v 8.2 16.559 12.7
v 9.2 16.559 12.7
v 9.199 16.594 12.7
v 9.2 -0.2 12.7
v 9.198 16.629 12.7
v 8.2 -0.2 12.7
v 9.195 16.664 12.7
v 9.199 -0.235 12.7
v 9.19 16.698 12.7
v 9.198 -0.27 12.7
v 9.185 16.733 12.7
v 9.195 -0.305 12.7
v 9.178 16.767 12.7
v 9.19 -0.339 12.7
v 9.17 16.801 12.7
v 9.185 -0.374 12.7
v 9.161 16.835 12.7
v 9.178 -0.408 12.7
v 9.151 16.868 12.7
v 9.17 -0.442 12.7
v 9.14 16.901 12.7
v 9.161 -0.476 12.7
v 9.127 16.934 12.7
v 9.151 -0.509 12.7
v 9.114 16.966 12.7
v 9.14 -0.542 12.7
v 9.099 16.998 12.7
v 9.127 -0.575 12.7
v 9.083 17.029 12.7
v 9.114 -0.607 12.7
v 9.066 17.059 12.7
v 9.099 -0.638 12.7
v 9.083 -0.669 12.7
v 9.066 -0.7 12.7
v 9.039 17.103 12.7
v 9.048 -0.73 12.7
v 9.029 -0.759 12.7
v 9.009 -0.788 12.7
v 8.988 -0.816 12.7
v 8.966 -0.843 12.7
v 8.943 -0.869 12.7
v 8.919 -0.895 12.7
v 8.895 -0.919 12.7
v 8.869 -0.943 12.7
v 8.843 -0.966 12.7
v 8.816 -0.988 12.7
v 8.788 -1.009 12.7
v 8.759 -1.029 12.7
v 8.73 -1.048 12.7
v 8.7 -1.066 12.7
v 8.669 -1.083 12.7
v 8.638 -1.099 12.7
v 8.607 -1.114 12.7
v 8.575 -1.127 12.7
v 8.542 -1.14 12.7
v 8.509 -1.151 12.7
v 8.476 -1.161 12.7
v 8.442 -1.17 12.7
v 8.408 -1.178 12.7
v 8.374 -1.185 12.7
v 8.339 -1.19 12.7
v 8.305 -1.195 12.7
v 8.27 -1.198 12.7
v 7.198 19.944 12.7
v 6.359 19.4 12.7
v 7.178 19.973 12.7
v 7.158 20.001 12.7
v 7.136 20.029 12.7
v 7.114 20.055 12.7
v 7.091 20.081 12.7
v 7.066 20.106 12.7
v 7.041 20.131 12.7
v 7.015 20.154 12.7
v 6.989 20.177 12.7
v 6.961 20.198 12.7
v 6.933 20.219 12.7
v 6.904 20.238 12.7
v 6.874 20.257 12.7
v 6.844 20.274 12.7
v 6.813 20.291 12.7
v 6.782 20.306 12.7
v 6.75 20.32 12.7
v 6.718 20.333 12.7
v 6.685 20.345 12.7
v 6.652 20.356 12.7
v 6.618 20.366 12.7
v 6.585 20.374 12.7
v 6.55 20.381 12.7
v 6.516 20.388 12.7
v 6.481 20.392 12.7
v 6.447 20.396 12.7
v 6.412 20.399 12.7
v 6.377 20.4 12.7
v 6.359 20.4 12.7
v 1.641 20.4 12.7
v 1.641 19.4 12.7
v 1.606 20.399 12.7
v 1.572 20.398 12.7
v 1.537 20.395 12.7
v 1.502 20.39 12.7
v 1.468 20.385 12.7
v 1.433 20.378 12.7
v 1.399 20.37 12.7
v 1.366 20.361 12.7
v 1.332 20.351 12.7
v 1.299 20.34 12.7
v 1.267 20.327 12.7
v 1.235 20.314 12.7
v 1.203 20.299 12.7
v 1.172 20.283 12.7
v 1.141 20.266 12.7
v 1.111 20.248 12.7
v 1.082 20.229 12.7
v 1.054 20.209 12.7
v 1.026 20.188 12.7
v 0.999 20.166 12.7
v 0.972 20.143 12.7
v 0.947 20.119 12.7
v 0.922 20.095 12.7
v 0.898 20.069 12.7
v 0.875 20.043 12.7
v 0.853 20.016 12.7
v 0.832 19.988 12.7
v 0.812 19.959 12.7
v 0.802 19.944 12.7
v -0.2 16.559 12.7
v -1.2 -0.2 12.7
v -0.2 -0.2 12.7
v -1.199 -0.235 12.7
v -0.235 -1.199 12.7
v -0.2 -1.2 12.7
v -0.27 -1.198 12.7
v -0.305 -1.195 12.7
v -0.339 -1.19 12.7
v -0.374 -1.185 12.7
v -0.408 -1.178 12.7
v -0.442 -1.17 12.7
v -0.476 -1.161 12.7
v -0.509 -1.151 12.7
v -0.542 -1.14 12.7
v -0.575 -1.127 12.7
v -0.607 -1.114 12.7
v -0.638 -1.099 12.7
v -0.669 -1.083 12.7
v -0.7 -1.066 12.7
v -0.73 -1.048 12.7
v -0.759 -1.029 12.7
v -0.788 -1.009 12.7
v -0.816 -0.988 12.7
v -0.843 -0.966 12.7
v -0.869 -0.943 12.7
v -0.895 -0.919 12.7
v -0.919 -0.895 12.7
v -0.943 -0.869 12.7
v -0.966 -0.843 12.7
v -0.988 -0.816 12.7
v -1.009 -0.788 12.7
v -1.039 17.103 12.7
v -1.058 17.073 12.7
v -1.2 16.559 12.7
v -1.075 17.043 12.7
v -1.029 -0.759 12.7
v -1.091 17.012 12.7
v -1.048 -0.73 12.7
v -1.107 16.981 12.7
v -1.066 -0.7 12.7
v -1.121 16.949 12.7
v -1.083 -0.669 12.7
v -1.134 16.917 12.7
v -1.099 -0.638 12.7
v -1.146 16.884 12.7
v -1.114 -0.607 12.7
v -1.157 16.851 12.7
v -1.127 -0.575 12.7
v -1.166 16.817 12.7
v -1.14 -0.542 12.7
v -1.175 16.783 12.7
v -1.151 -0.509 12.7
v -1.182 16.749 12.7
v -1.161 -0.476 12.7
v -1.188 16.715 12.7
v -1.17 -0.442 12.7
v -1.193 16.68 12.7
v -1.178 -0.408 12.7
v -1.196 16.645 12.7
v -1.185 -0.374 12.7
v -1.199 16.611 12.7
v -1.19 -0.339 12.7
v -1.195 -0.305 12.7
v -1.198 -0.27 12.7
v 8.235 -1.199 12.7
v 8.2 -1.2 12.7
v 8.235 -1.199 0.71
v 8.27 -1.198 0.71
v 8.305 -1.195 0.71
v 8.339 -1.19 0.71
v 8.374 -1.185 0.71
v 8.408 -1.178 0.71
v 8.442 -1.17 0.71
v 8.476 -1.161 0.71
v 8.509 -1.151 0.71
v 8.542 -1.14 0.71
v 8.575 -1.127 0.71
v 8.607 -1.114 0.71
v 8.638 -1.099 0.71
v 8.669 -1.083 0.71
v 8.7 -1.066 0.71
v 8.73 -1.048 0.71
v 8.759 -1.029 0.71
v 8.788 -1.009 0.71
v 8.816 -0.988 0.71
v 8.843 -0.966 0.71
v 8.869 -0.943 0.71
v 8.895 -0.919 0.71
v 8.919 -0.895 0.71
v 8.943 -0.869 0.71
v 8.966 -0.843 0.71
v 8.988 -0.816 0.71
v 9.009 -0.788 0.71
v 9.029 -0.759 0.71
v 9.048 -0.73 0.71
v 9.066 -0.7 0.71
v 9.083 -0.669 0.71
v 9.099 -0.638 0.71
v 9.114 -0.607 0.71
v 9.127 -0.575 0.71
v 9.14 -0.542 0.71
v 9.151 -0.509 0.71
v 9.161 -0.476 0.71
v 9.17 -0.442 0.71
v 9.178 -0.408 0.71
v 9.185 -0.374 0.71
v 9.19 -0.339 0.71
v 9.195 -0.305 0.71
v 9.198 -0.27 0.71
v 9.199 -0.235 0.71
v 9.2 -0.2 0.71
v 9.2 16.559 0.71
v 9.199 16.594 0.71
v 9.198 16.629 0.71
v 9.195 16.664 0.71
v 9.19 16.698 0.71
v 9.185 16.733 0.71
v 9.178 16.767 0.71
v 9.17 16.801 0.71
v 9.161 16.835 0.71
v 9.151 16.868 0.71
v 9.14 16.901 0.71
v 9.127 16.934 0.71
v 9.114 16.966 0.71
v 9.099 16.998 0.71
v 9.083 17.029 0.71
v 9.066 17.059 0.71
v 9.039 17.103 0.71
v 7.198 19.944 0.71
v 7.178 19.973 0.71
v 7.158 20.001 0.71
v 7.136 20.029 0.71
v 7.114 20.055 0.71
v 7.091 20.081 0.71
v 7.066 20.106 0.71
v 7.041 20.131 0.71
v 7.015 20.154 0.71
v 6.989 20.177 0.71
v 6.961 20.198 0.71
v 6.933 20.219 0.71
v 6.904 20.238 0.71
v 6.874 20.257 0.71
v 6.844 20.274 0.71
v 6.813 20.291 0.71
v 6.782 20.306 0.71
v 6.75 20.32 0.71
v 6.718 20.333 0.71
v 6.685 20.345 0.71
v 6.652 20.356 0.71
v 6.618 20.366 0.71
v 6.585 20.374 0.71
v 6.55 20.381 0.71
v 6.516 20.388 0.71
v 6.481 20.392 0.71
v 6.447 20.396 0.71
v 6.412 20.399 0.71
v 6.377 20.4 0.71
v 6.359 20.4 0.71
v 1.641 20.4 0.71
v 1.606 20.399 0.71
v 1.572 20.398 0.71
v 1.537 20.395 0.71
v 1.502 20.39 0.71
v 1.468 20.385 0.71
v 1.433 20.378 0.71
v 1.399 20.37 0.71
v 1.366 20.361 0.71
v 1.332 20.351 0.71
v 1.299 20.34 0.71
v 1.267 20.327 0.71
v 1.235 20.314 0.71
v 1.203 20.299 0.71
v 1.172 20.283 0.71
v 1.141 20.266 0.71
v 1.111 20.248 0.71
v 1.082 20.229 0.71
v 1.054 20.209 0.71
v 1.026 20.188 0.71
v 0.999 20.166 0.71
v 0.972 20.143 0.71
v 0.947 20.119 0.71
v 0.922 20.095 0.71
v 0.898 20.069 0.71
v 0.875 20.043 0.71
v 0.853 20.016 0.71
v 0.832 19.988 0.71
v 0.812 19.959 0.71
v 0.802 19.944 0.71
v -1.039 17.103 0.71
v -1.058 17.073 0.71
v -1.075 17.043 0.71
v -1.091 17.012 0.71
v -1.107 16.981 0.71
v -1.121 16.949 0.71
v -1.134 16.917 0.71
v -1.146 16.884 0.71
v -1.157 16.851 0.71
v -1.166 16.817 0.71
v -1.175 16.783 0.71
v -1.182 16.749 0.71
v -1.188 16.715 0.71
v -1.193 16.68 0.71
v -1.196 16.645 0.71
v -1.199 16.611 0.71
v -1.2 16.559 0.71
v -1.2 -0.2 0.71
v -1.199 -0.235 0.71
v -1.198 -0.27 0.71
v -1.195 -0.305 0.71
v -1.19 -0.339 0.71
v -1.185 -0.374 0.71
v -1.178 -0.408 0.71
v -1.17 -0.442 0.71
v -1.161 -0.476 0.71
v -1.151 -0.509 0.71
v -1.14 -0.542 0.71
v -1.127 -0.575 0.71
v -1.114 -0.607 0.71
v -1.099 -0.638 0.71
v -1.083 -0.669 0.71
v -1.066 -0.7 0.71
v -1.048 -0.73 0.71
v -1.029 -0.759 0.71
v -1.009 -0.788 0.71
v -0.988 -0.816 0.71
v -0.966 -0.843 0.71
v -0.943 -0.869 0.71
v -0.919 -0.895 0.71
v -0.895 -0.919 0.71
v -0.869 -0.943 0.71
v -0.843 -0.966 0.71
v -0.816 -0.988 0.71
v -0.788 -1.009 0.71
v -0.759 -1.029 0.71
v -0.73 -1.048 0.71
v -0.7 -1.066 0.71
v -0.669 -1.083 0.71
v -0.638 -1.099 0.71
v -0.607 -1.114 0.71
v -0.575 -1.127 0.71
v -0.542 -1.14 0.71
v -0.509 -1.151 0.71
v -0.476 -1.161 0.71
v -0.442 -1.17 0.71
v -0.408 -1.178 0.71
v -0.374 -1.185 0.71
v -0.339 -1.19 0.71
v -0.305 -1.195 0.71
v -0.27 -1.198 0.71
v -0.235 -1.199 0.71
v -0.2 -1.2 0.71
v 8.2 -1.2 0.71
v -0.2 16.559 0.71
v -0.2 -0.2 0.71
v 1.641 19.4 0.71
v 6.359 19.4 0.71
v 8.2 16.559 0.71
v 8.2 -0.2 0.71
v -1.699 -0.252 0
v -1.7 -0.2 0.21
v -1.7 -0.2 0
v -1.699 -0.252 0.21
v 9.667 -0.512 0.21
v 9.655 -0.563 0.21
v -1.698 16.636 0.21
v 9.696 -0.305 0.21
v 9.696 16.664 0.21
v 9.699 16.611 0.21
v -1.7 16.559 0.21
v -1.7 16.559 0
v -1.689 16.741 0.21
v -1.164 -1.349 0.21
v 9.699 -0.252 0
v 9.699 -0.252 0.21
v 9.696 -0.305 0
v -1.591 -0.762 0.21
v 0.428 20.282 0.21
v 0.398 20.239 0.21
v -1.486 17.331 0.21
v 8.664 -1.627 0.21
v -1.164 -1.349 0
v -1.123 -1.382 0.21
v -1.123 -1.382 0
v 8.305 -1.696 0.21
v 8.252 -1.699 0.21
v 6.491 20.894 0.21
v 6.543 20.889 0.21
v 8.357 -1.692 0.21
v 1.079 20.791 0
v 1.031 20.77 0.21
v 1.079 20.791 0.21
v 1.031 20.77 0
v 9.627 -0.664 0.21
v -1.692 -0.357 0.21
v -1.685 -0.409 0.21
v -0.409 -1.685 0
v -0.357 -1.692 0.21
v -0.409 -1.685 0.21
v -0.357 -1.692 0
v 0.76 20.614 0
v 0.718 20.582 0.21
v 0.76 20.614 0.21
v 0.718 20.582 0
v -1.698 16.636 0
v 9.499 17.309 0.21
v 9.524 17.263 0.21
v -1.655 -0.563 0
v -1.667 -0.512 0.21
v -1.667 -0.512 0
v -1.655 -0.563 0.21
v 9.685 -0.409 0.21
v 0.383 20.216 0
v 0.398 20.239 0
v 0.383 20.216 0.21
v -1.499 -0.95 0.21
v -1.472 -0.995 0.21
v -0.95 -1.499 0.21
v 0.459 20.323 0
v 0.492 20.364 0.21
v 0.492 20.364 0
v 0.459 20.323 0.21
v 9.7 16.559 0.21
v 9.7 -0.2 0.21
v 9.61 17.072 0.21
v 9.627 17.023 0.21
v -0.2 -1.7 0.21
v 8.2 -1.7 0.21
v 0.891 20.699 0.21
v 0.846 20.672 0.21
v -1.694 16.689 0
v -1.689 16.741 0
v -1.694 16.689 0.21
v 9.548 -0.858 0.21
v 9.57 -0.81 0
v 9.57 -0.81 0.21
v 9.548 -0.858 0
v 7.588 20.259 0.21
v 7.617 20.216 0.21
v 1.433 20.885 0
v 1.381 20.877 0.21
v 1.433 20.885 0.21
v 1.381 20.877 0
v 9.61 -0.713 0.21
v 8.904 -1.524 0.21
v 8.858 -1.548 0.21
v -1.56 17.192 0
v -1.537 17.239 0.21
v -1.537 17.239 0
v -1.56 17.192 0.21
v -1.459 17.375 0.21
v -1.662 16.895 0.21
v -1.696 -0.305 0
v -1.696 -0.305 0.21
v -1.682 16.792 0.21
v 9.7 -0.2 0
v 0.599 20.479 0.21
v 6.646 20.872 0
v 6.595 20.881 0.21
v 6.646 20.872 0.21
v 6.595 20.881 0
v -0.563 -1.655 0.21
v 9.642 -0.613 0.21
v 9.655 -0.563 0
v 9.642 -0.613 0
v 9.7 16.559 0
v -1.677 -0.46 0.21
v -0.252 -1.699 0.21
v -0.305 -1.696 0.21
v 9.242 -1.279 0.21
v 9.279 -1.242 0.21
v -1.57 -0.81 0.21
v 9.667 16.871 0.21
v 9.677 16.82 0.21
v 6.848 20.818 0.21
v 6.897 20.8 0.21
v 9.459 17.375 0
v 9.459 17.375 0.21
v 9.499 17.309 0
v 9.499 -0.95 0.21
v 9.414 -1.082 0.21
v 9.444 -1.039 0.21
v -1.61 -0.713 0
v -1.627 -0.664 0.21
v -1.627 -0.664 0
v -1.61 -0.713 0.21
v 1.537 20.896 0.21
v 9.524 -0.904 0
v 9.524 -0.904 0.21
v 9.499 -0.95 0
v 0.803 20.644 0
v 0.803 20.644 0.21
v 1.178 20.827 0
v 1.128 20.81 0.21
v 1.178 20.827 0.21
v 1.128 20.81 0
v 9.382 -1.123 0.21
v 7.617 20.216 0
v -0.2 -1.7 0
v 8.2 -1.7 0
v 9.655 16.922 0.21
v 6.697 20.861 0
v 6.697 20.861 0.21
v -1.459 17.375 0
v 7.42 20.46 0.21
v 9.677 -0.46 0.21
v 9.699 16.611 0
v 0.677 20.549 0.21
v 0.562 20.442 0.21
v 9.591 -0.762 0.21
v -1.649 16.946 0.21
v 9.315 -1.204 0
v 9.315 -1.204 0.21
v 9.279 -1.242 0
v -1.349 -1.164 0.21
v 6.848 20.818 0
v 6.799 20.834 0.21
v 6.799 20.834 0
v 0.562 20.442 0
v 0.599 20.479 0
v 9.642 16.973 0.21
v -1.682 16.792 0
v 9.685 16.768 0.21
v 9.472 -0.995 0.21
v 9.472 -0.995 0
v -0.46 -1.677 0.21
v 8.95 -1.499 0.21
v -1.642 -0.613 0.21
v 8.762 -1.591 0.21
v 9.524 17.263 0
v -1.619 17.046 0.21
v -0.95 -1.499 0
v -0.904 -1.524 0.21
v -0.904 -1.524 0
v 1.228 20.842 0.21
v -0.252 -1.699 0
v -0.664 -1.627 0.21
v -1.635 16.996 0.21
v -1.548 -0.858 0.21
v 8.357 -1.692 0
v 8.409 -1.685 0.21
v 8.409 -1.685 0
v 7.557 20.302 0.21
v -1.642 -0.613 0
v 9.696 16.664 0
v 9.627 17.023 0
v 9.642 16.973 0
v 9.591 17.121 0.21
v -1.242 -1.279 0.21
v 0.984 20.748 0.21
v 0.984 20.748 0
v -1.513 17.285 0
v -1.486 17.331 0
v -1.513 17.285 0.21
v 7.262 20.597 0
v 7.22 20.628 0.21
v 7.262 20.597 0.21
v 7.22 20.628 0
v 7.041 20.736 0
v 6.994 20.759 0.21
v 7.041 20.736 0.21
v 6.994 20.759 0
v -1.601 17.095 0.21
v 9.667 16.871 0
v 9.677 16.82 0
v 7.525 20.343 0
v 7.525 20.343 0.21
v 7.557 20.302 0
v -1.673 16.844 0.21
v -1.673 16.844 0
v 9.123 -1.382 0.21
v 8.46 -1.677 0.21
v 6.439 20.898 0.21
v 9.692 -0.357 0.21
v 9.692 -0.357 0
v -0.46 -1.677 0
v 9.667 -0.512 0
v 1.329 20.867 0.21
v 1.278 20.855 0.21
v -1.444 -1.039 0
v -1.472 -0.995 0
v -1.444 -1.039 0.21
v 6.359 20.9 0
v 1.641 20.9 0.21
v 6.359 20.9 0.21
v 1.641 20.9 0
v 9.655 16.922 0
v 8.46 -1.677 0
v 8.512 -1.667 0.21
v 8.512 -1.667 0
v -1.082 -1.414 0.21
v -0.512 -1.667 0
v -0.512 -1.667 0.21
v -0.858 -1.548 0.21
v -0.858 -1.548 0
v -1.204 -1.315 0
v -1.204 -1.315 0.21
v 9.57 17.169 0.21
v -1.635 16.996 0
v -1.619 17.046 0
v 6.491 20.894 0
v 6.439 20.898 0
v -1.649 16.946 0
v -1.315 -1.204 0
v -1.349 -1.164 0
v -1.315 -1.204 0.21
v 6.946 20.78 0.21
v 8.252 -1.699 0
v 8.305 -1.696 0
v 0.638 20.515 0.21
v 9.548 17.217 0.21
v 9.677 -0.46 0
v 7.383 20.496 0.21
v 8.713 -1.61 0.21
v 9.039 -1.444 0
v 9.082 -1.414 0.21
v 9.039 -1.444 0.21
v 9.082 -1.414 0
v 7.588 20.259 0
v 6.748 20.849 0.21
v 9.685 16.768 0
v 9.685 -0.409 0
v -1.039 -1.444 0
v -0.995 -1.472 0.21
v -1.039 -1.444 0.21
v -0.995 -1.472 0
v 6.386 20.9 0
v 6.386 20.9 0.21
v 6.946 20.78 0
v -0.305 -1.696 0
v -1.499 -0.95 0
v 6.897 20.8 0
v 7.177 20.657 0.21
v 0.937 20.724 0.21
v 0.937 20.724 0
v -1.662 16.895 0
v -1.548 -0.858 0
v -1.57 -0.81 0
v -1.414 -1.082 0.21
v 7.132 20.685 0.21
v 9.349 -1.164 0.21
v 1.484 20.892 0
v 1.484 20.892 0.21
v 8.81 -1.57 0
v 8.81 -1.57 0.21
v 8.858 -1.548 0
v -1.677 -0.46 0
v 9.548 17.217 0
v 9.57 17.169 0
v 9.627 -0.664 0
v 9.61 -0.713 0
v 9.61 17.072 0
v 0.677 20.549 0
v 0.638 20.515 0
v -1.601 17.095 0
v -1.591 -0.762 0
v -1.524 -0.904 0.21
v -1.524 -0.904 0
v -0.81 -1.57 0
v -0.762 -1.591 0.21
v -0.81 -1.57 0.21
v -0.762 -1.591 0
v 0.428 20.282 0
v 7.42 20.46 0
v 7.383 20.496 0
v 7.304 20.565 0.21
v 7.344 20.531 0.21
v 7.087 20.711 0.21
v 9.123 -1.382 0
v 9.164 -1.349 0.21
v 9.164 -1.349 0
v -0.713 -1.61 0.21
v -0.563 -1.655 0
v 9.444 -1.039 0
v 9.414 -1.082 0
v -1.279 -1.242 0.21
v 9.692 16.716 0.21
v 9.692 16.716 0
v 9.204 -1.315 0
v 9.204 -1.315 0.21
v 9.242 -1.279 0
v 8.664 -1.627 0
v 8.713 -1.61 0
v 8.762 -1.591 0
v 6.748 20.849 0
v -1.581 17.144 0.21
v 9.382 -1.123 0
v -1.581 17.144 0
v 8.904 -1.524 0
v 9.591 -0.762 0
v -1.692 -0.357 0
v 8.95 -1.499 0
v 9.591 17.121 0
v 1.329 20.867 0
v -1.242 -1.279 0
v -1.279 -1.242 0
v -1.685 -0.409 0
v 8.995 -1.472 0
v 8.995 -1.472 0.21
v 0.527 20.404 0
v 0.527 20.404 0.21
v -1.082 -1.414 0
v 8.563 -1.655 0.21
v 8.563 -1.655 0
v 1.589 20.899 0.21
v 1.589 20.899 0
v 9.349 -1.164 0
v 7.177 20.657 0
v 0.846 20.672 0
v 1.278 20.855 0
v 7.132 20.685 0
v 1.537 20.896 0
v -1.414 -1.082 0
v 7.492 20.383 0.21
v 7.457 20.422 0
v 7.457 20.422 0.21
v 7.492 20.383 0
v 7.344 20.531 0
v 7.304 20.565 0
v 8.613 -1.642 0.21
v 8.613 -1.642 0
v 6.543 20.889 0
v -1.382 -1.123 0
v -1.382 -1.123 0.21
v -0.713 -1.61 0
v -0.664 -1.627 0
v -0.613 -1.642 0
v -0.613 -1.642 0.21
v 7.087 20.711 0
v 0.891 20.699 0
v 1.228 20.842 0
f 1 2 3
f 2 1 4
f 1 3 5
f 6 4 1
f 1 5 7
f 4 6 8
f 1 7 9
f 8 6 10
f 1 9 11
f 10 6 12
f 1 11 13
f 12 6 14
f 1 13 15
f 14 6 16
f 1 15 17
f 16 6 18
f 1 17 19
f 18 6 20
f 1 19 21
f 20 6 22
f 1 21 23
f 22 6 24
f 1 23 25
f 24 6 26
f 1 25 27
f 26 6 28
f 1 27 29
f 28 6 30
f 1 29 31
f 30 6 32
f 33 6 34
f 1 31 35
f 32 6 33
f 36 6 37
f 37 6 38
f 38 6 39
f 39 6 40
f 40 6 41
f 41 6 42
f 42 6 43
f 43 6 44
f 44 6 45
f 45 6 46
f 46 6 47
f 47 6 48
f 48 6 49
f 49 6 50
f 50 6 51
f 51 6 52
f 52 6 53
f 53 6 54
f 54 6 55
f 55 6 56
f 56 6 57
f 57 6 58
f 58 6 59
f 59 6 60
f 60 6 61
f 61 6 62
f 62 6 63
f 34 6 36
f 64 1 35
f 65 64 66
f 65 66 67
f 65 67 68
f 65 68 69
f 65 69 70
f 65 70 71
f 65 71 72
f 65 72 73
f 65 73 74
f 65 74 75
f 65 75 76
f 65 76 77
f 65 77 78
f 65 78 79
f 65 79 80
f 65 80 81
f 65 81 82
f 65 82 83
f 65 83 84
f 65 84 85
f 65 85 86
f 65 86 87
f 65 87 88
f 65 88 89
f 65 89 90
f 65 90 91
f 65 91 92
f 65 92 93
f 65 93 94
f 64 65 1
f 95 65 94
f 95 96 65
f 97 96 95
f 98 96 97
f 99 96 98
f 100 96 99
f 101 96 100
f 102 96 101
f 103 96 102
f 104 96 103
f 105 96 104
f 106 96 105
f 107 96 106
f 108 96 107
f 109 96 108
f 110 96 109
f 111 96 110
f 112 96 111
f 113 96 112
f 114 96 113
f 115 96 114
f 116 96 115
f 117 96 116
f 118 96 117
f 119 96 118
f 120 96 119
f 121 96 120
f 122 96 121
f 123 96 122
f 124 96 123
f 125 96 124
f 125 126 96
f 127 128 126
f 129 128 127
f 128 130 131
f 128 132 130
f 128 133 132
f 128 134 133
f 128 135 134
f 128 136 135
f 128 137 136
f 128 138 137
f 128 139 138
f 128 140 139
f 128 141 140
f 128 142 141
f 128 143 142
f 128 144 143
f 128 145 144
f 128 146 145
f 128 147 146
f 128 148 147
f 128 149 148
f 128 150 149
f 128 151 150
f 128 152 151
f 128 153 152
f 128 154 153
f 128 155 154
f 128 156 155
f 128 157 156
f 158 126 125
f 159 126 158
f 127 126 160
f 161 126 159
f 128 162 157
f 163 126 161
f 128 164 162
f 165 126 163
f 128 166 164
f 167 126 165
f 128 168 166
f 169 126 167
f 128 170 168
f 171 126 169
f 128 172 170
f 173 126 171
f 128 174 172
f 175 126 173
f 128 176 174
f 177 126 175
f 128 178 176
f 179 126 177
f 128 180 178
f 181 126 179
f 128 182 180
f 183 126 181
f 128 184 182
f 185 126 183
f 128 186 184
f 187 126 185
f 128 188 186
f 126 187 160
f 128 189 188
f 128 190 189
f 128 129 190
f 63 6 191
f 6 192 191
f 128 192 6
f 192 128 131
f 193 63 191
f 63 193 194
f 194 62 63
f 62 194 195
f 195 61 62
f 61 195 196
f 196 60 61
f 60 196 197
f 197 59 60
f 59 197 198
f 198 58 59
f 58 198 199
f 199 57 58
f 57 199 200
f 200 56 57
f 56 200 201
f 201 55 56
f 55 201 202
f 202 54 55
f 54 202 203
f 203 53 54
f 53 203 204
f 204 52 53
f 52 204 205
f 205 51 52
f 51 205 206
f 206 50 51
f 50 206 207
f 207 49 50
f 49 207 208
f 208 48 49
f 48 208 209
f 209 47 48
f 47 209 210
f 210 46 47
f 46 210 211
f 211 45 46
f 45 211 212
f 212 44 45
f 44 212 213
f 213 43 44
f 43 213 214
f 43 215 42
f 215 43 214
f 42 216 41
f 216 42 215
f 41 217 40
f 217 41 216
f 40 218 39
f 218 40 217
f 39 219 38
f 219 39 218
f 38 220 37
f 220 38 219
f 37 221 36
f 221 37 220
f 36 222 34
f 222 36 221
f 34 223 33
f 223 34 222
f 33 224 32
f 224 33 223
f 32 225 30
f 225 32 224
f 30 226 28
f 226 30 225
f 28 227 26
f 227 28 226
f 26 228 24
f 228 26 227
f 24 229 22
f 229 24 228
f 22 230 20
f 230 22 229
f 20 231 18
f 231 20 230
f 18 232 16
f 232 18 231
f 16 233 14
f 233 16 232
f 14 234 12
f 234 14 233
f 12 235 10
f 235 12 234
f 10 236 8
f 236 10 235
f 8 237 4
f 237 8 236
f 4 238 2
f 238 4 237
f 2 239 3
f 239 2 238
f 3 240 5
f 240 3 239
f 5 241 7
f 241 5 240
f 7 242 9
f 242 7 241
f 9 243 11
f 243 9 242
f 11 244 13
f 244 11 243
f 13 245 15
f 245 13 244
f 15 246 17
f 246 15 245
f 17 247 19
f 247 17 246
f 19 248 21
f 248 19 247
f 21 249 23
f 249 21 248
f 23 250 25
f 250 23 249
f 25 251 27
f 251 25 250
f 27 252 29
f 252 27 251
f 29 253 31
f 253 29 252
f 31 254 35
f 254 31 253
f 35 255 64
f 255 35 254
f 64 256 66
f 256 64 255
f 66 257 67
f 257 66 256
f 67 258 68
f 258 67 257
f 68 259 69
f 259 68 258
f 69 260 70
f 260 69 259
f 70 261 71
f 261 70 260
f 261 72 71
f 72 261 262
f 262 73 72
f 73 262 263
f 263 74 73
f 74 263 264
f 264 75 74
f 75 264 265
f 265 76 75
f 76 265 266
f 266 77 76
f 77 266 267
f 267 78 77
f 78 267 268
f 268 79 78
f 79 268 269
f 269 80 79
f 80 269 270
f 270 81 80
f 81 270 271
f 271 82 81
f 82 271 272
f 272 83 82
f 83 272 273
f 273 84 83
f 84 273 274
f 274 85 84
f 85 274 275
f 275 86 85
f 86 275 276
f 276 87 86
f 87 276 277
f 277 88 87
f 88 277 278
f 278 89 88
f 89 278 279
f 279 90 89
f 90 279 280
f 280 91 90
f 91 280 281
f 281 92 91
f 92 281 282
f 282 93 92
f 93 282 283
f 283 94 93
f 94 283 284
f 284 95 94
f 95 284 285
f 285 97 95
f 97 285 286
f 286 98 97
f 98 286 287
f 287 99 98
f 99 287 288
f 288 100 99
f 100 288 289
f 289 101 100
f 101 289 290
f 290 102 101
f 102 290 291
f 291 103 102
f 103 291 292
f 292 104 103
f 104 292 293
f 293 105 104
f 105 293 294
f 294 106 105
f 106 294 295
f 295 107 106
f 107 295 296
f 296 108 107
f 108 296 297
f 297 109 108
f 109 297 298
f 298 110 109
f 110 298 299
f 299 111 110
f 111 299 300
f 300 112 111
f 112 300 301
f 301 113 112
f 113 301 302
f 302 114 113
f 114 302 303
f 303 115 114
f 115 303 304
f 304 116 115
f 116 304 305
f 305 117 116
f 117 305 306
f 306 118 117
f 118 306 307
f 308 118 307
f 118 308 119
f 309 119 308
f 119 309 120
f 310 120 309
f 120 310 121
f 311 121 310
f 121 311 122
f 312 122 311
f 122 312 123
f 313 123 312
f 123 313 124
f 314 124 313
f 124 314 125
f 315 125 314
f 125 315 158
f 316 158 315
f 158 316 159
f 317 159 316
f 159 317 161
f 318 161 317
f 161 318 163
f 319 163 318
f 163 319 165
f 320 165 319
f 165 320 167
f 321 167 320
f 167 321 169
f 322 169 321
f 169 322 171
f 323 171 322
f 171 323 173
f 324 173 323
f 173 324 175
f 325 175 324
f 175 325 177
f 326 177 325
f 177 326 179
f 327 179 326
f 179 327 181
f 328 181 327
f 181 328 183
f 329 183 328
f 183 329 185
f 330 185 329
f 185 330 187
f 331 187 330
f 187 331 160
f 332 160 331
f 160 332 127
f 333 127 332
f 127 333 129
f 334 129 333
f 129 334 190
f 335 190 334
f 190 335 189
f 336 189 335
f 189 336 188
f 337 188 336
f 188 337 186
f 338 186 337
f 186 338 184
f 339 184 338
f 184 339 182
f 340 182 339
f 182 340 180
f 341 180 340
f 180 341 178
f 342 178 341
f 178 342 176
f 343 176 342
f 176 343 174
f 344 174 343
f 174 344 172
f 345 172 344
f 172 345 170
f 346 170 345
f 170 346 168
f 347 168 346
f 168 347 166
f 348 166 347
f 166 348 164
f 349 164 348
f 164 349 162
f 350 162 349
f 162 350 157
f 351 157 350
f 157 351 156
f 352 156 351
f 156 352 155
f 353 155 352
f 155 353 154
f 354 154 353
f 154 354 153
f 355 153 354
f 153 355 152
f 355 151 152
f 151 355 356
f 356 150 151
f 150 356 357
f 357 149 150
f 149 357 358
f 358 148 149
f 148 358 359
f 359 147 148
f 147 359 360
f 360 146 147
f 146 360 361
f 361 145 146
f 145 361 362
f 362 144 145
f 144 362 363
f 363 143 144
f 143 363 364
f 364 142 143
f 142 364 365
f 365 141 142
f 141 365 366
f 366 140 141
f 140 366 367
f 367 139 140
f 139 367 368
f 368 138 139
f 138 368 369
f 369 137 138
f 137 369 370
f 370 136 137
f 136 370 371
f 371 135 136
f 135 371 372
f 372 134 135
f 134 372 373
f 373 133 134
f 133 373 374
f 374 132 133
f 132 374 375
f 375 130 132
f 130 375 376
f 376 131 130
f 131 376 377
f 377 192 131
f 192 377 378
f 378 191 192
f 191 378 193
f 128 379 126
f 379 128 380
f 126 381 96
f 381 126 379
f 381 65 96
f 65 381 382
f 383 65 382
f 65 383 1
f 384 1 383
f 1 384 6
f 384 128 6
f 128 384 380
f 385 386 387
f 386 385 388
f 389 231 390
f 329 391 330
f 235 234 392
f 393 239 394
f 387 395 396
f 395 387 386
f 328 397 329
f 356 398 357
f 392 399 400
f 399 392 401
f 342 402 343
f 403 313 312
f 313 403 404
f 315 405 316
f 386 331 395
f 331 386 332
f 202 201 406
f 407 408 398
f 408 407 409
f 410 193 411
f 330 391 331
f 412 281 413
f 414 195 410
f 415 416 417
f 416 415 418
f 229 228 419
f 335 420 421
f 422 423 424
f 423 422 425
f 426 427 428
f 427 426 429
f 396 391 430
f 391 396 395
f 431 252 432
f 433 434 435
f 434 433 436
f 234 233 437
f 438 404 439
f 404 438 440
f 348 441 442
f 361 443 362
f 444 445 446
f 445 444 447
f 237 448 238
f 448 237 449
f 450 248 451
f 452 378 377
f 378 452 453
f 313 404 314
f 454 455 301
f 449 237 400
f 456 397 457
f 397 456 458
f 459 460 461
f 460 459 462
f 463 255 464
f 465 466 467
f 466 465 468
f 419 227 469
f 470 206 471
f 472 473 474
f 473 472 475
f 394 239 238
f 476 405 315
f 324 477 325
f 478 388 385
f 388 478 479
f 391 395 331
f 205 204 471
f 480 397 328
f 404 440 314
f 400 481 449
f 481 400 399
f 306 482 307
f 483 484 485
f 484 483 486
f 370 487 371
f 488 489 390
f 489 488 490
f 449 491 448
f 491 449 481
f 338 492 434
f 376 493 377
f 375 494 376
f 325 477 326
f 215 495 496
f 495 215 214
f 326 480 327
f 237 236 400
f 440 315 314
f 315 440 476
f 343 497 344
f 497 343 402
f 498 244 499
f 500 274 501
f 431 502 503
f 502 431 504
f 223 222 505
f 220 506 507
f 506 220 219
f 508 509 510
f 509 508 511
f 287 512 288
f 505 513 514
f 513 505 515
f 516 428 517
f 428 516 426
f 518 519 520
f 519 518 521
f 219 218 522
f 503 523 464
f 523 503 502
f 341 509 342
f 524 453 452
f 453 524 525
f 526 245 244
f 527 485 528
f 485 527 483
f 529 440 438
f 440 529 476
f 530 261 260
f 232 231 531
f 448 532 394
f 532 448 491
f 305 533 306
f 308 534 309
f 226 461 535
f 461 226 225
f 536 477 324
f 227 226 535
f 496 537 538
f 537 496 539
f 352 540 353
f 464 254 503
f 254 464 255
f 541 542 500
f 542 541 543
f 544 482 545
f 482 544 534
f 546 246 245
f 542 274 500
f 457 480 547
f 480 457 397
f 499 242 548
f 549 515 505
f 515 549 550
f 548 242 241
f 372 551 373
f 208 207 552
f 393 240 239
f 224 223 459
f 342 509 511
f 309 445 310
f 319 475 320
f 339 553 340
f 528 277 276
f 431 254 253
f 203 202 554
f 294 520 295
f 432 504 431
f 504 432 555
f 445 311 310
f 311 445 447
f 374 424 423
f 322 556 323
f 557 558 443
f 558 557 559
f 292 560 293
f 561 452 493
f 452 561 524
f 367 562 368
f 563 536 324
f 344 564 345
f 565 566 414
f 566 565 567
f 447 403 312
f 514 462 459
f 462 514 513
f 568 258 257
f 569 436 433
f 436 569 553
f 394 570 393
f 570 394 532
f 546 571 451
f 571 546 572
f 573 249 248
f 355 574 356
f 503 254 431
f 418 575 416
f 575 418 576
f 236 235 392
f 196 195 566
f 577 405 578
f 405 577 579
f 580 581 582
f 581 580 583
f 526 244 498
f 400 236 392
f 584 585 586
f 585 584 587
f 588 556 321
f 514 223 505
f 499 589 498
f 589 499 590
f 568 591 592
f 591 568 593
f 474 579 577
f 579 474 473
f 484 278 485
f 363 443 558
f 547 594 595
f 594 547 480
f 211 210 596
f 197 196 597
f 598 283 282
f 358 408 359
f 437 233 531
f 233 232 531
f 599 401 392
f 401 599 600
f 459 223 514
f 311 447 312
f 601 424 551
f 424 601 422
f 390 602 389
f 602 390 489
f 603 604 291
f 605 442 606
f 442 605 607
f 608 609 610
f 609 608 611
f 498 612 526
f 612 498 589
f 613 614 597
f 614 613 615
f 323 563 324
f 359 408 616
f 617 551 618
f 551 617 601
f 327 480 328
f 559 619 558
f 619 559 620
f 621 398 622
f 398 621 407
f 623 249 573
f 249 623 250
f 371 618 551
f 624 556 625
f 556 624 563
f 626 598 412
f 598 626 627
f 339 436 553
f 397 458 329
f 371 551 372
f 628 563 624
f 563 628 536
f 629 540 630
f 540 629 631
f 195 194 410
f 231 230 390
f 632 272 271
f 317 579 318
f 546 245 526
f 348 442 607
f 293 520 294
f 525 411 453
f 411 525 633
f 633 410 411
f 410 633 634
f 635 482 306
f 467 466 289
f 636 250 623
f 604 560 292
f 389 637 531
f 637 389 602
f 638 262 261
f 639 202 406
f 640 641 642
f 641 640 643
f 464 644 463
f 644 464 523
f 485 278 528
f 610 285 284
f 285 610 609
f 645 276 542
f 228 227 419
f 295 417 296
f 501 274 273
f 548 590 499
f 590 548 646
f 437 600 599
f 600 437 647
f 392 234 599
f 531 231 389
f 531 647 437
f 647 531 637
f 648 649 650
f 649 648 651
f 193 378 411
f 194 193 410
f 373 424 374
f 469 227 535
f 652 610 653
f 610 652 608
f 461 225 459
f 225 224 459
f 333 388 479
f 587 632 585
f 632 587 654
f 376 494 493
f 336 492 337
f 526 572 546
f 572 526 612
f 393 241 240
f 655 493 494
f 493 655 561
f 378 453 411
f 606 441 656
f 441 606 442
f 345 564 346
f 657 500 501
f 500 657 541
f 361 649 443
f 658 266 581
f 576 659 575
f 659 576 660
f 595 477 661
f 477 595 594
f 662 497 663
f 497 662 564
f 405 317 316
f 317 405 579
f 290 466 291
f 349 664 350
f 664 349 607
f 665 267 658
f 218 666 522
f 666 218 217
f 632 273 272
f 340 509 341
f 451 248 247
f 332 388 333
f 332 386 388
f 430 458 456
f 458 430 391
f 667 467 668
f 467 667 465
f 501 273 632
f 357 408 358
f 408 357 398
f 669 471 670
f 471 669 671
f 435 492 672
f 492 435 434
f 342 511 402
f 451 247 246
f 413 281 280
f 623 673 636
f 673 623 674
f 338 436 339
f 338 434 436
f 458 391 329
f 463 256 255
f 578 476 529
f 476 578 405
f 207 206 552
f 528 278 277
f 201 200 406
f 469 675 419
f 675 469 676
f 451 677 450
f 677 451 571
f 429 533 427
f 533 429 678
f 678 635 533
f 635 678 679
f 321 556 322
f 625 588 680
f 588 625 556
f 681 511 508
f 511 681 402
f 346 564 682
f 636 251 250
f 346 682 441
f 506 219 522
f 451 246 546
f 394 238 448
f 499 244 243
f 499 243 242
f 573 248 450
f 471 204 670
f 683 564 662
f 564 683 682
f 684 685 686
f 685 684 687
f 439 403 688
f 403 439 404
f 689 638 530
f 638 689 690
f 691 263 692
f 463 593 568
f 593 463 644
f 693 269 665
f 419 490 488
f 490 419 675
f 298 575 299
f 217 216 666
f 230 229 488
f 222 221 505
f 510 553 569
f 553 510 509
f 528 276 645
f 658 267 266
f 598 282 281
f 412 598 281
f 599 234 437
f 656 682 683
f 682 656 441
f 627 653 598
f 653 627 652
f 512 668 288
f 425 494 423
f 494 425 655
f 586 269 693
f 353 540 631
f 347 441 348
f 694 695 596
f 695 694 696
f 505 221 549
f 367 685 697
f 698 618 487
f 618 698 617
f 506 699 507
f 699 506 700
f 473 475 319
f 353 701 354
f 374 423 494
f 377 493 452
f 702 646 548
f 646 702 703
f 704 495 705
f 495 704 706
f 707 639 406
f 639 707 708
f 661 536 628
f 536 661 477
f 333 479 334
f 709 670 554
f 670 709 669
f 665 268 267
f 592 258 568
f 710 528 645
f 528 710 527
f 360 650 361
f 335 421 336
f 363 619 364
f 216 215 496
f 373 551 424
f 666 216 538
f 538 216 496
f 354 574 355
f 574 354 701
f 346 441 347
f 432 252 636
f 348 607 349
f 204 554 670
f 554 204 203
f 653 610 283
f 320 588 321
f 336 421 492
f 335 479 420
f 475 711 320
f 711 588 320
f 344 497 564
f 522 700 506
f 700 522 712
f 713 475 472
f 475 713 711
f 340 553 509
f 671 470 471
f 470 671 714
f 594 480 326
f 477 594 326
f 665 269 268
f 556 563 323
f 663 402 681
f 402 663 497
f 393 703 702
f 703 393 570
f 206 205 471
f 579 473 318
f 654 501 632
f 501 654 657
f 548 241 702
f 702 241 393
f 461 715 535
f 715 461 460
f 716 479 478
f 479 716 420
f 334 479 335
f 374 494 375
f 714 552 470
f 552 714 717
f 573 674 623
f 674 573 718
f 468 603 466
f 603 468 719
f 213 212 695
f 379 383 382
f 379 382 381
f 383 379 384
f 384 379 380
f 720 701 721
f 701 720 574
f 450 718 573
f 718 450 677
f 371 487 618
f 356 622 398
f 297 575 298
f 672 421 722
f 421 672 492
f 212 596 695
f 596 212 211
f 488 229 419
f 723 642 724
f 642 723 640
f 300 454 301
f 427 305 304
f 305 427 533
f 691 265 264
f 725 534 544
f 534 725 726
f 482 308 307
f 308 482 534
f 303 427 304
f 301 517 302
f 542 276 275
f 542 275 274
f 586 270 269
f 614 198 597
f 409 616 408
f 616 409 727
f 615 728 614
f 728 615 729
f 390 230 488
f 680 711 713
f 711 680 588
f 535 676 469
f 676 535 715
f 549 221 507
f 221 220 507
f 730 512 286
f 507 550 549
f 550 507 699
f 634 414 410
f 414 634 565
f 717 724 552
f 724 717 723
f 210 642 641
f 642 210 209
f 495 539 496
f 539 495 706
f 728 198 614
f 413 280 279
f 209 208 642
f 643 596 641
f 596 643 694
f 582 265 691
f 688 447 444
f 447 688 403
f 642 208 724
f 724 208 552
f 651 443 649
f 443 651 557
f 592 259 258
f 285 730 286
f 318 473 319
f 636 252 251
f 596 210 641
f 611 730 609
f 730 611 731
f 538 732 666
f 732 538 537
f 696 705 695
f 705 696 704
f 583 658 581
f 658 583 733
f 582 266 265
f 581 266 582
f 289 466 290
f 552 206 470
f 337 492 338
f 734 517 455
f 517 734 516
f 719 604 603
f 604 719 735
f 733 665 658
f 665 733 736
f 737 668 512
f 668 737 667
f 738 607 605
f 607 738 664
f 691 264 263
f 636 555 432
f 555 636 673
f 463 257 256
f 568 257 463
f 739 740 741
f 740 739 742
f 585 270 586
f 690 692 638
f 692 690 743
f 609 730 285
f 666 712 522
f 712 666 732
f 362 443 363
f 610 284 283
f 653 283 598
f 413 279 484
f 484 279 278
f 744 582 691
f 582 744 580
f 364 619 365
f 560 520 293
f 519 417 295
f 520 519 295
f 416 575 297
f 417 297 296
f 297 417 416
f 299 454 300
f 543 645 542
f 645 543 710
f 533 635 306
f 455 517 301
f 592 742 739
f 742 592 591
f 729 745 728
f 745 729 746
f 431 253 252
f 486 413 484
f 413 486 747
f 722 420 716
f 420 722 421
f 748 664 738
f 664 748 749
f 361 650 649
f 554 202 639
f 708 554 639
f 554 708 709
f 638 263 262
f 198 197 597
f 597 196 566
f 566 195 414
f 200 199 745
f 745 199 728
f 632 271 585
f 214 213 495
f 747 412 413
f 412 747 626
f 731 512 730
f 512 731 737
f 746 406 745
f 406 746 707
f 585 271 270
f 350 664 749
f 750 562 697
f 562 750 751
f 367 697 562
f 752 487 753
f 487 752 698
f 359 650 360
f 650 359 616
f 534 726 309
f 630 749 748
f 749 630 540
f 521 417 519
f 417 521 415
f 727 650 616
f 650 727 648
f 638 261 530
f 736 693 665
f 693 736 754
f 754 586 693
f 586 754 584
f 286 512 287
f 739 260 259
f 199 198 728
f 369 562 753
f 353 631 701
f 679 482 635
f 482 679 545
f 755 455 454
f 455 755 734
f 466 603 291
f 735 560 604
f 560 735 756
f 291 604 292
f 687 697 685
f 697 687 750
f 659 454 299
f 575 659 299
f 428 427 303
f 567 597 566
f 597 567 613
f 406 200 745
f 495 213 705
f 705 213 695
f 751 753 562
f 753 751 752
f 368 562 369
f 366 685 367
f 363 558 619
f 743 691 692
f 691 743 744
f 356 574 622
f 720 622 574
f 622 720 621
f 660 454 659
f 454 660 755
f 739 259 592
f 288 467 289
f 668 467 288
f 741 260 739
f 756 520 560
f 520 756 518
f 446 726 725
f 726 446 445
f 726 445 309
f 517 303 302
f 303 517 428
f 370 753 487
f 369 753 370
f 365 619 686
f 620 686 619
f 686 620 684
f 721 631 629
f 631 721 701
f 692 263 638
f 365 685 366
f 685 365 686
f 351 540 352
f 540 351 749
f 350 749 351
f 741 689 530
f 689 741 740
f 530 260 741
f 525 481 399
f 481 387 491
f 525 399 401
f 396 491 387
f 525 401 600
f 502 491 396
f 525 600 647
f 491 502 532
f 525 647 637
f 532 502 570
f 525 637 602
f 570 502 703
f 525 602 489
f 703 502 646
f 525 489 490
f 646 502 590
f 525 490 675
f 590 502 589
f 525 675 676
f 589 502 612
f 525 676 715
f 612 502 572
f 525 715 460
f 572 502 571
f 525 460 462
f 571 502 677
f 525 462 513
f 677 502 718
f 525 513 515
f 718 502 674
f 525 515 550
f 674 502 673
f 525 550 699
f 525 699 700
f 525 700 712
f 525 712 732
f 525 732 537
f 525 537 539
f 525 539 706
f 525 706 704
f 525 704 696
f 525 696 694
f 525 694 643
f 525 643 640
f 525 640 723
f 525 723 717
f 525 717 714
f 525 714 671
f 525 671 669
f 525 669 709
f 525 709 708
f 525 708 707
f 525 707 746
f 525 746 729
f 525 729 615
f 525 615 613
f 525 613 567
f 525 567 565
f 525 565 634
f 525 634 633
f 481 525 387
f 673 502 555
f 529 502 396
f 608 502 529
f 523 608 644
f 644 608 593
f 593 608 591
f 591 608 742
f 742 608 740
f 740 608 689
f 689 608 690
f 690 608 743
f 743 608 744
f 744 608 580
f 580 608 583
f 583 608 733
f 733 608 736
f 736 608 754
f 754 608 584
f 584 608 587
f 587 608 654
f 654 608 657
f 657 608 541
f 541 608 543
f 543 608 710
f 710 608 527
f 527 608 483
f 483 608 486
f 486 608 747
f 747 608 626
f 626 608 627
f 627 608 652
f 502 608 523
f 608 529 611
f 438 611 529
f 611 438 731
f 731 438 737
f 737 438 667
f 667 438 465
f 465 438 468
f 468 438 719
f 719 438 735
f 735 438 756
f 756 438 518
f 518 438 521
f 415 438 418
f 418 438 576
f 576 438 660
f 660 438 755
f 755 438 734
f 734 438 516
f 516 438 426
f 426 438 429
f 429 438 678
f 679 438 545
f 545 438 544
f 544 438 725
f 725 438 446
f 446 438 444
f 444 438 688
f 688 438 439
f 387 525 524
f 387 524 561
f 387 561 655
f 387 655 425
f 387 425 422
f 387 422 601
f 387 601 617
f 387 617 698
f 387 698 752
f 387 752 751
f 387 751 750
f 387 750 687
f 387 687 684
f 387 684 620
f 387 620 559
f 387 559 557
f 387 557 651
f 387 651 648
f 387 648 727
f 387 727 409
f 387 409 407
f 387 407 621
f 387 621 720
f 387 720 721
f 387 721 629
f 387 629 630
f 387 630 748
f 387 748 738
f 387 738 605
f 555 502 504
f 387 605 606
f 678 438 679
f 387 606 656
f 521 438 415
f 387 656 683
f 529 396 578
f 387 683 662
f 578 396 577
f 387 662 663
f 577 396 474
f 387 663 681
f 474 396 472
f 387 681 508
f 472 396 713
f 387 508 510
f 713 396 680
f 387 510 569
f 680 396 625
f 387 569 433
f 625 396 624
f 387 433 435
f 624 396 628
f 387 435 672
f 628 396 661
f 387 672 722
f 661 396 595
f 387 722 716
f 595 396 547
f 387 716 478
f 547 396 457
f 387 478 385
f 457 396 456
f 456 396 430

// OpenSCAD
w = 8;
wt = 4.5;
l1 = 16.5;
lo = 19.2;
h = 12;
chamfer_height = 0.5;
base_thick = 0.2;
wall_thick = 1;
$fa = 2;
$fs = 0.02;

module xtfoot() {
    offset(delta=.2) // give it a bit of wiggle room.
        polygon([[0, 0], [w, 0], [w, l1],
            [w/2 + wt/2, lo], [w/2 - wt/2, lo], [0, l1]]);
}

module xterior(thickness) {
    linear_extrude(h) {
        difference() {
            offset(thickness) xtfoot();
            xtfoot();
        }
    }
}

module grip() {
  linear_extrude(h) circle(0.5);
}

module grips() {
    for(yo = [l1 * (1/4), l1 * (3/4)]) {
        translate([wall_thick / -4, yo, base_thick + chamfer_height]) grip();
        translate([w - (wall_thick / -4), yo, base_thick + chamfer_height]) grip();        
    }
}

module xt90() {
    // Walls
    translate([0, 0, base_thick + chamfer_height]) xterior(wall_thick);
    
    // Additional little grips to friction fit better
    // grips();
    
    // Chamfer transition
    translate([0, 0, base_thick])
    hull() {
        linear_extrude(0.01) offset(1.5) xtfoot();
        translate([0, 0, chamfer_height]) 
            linear_extrude(0.01) offset(1) xtfoot();
    }
    
    // Bottom base
    linear_extrude(base_thick) offset(1.5) xtfoot();
}

xt90();
